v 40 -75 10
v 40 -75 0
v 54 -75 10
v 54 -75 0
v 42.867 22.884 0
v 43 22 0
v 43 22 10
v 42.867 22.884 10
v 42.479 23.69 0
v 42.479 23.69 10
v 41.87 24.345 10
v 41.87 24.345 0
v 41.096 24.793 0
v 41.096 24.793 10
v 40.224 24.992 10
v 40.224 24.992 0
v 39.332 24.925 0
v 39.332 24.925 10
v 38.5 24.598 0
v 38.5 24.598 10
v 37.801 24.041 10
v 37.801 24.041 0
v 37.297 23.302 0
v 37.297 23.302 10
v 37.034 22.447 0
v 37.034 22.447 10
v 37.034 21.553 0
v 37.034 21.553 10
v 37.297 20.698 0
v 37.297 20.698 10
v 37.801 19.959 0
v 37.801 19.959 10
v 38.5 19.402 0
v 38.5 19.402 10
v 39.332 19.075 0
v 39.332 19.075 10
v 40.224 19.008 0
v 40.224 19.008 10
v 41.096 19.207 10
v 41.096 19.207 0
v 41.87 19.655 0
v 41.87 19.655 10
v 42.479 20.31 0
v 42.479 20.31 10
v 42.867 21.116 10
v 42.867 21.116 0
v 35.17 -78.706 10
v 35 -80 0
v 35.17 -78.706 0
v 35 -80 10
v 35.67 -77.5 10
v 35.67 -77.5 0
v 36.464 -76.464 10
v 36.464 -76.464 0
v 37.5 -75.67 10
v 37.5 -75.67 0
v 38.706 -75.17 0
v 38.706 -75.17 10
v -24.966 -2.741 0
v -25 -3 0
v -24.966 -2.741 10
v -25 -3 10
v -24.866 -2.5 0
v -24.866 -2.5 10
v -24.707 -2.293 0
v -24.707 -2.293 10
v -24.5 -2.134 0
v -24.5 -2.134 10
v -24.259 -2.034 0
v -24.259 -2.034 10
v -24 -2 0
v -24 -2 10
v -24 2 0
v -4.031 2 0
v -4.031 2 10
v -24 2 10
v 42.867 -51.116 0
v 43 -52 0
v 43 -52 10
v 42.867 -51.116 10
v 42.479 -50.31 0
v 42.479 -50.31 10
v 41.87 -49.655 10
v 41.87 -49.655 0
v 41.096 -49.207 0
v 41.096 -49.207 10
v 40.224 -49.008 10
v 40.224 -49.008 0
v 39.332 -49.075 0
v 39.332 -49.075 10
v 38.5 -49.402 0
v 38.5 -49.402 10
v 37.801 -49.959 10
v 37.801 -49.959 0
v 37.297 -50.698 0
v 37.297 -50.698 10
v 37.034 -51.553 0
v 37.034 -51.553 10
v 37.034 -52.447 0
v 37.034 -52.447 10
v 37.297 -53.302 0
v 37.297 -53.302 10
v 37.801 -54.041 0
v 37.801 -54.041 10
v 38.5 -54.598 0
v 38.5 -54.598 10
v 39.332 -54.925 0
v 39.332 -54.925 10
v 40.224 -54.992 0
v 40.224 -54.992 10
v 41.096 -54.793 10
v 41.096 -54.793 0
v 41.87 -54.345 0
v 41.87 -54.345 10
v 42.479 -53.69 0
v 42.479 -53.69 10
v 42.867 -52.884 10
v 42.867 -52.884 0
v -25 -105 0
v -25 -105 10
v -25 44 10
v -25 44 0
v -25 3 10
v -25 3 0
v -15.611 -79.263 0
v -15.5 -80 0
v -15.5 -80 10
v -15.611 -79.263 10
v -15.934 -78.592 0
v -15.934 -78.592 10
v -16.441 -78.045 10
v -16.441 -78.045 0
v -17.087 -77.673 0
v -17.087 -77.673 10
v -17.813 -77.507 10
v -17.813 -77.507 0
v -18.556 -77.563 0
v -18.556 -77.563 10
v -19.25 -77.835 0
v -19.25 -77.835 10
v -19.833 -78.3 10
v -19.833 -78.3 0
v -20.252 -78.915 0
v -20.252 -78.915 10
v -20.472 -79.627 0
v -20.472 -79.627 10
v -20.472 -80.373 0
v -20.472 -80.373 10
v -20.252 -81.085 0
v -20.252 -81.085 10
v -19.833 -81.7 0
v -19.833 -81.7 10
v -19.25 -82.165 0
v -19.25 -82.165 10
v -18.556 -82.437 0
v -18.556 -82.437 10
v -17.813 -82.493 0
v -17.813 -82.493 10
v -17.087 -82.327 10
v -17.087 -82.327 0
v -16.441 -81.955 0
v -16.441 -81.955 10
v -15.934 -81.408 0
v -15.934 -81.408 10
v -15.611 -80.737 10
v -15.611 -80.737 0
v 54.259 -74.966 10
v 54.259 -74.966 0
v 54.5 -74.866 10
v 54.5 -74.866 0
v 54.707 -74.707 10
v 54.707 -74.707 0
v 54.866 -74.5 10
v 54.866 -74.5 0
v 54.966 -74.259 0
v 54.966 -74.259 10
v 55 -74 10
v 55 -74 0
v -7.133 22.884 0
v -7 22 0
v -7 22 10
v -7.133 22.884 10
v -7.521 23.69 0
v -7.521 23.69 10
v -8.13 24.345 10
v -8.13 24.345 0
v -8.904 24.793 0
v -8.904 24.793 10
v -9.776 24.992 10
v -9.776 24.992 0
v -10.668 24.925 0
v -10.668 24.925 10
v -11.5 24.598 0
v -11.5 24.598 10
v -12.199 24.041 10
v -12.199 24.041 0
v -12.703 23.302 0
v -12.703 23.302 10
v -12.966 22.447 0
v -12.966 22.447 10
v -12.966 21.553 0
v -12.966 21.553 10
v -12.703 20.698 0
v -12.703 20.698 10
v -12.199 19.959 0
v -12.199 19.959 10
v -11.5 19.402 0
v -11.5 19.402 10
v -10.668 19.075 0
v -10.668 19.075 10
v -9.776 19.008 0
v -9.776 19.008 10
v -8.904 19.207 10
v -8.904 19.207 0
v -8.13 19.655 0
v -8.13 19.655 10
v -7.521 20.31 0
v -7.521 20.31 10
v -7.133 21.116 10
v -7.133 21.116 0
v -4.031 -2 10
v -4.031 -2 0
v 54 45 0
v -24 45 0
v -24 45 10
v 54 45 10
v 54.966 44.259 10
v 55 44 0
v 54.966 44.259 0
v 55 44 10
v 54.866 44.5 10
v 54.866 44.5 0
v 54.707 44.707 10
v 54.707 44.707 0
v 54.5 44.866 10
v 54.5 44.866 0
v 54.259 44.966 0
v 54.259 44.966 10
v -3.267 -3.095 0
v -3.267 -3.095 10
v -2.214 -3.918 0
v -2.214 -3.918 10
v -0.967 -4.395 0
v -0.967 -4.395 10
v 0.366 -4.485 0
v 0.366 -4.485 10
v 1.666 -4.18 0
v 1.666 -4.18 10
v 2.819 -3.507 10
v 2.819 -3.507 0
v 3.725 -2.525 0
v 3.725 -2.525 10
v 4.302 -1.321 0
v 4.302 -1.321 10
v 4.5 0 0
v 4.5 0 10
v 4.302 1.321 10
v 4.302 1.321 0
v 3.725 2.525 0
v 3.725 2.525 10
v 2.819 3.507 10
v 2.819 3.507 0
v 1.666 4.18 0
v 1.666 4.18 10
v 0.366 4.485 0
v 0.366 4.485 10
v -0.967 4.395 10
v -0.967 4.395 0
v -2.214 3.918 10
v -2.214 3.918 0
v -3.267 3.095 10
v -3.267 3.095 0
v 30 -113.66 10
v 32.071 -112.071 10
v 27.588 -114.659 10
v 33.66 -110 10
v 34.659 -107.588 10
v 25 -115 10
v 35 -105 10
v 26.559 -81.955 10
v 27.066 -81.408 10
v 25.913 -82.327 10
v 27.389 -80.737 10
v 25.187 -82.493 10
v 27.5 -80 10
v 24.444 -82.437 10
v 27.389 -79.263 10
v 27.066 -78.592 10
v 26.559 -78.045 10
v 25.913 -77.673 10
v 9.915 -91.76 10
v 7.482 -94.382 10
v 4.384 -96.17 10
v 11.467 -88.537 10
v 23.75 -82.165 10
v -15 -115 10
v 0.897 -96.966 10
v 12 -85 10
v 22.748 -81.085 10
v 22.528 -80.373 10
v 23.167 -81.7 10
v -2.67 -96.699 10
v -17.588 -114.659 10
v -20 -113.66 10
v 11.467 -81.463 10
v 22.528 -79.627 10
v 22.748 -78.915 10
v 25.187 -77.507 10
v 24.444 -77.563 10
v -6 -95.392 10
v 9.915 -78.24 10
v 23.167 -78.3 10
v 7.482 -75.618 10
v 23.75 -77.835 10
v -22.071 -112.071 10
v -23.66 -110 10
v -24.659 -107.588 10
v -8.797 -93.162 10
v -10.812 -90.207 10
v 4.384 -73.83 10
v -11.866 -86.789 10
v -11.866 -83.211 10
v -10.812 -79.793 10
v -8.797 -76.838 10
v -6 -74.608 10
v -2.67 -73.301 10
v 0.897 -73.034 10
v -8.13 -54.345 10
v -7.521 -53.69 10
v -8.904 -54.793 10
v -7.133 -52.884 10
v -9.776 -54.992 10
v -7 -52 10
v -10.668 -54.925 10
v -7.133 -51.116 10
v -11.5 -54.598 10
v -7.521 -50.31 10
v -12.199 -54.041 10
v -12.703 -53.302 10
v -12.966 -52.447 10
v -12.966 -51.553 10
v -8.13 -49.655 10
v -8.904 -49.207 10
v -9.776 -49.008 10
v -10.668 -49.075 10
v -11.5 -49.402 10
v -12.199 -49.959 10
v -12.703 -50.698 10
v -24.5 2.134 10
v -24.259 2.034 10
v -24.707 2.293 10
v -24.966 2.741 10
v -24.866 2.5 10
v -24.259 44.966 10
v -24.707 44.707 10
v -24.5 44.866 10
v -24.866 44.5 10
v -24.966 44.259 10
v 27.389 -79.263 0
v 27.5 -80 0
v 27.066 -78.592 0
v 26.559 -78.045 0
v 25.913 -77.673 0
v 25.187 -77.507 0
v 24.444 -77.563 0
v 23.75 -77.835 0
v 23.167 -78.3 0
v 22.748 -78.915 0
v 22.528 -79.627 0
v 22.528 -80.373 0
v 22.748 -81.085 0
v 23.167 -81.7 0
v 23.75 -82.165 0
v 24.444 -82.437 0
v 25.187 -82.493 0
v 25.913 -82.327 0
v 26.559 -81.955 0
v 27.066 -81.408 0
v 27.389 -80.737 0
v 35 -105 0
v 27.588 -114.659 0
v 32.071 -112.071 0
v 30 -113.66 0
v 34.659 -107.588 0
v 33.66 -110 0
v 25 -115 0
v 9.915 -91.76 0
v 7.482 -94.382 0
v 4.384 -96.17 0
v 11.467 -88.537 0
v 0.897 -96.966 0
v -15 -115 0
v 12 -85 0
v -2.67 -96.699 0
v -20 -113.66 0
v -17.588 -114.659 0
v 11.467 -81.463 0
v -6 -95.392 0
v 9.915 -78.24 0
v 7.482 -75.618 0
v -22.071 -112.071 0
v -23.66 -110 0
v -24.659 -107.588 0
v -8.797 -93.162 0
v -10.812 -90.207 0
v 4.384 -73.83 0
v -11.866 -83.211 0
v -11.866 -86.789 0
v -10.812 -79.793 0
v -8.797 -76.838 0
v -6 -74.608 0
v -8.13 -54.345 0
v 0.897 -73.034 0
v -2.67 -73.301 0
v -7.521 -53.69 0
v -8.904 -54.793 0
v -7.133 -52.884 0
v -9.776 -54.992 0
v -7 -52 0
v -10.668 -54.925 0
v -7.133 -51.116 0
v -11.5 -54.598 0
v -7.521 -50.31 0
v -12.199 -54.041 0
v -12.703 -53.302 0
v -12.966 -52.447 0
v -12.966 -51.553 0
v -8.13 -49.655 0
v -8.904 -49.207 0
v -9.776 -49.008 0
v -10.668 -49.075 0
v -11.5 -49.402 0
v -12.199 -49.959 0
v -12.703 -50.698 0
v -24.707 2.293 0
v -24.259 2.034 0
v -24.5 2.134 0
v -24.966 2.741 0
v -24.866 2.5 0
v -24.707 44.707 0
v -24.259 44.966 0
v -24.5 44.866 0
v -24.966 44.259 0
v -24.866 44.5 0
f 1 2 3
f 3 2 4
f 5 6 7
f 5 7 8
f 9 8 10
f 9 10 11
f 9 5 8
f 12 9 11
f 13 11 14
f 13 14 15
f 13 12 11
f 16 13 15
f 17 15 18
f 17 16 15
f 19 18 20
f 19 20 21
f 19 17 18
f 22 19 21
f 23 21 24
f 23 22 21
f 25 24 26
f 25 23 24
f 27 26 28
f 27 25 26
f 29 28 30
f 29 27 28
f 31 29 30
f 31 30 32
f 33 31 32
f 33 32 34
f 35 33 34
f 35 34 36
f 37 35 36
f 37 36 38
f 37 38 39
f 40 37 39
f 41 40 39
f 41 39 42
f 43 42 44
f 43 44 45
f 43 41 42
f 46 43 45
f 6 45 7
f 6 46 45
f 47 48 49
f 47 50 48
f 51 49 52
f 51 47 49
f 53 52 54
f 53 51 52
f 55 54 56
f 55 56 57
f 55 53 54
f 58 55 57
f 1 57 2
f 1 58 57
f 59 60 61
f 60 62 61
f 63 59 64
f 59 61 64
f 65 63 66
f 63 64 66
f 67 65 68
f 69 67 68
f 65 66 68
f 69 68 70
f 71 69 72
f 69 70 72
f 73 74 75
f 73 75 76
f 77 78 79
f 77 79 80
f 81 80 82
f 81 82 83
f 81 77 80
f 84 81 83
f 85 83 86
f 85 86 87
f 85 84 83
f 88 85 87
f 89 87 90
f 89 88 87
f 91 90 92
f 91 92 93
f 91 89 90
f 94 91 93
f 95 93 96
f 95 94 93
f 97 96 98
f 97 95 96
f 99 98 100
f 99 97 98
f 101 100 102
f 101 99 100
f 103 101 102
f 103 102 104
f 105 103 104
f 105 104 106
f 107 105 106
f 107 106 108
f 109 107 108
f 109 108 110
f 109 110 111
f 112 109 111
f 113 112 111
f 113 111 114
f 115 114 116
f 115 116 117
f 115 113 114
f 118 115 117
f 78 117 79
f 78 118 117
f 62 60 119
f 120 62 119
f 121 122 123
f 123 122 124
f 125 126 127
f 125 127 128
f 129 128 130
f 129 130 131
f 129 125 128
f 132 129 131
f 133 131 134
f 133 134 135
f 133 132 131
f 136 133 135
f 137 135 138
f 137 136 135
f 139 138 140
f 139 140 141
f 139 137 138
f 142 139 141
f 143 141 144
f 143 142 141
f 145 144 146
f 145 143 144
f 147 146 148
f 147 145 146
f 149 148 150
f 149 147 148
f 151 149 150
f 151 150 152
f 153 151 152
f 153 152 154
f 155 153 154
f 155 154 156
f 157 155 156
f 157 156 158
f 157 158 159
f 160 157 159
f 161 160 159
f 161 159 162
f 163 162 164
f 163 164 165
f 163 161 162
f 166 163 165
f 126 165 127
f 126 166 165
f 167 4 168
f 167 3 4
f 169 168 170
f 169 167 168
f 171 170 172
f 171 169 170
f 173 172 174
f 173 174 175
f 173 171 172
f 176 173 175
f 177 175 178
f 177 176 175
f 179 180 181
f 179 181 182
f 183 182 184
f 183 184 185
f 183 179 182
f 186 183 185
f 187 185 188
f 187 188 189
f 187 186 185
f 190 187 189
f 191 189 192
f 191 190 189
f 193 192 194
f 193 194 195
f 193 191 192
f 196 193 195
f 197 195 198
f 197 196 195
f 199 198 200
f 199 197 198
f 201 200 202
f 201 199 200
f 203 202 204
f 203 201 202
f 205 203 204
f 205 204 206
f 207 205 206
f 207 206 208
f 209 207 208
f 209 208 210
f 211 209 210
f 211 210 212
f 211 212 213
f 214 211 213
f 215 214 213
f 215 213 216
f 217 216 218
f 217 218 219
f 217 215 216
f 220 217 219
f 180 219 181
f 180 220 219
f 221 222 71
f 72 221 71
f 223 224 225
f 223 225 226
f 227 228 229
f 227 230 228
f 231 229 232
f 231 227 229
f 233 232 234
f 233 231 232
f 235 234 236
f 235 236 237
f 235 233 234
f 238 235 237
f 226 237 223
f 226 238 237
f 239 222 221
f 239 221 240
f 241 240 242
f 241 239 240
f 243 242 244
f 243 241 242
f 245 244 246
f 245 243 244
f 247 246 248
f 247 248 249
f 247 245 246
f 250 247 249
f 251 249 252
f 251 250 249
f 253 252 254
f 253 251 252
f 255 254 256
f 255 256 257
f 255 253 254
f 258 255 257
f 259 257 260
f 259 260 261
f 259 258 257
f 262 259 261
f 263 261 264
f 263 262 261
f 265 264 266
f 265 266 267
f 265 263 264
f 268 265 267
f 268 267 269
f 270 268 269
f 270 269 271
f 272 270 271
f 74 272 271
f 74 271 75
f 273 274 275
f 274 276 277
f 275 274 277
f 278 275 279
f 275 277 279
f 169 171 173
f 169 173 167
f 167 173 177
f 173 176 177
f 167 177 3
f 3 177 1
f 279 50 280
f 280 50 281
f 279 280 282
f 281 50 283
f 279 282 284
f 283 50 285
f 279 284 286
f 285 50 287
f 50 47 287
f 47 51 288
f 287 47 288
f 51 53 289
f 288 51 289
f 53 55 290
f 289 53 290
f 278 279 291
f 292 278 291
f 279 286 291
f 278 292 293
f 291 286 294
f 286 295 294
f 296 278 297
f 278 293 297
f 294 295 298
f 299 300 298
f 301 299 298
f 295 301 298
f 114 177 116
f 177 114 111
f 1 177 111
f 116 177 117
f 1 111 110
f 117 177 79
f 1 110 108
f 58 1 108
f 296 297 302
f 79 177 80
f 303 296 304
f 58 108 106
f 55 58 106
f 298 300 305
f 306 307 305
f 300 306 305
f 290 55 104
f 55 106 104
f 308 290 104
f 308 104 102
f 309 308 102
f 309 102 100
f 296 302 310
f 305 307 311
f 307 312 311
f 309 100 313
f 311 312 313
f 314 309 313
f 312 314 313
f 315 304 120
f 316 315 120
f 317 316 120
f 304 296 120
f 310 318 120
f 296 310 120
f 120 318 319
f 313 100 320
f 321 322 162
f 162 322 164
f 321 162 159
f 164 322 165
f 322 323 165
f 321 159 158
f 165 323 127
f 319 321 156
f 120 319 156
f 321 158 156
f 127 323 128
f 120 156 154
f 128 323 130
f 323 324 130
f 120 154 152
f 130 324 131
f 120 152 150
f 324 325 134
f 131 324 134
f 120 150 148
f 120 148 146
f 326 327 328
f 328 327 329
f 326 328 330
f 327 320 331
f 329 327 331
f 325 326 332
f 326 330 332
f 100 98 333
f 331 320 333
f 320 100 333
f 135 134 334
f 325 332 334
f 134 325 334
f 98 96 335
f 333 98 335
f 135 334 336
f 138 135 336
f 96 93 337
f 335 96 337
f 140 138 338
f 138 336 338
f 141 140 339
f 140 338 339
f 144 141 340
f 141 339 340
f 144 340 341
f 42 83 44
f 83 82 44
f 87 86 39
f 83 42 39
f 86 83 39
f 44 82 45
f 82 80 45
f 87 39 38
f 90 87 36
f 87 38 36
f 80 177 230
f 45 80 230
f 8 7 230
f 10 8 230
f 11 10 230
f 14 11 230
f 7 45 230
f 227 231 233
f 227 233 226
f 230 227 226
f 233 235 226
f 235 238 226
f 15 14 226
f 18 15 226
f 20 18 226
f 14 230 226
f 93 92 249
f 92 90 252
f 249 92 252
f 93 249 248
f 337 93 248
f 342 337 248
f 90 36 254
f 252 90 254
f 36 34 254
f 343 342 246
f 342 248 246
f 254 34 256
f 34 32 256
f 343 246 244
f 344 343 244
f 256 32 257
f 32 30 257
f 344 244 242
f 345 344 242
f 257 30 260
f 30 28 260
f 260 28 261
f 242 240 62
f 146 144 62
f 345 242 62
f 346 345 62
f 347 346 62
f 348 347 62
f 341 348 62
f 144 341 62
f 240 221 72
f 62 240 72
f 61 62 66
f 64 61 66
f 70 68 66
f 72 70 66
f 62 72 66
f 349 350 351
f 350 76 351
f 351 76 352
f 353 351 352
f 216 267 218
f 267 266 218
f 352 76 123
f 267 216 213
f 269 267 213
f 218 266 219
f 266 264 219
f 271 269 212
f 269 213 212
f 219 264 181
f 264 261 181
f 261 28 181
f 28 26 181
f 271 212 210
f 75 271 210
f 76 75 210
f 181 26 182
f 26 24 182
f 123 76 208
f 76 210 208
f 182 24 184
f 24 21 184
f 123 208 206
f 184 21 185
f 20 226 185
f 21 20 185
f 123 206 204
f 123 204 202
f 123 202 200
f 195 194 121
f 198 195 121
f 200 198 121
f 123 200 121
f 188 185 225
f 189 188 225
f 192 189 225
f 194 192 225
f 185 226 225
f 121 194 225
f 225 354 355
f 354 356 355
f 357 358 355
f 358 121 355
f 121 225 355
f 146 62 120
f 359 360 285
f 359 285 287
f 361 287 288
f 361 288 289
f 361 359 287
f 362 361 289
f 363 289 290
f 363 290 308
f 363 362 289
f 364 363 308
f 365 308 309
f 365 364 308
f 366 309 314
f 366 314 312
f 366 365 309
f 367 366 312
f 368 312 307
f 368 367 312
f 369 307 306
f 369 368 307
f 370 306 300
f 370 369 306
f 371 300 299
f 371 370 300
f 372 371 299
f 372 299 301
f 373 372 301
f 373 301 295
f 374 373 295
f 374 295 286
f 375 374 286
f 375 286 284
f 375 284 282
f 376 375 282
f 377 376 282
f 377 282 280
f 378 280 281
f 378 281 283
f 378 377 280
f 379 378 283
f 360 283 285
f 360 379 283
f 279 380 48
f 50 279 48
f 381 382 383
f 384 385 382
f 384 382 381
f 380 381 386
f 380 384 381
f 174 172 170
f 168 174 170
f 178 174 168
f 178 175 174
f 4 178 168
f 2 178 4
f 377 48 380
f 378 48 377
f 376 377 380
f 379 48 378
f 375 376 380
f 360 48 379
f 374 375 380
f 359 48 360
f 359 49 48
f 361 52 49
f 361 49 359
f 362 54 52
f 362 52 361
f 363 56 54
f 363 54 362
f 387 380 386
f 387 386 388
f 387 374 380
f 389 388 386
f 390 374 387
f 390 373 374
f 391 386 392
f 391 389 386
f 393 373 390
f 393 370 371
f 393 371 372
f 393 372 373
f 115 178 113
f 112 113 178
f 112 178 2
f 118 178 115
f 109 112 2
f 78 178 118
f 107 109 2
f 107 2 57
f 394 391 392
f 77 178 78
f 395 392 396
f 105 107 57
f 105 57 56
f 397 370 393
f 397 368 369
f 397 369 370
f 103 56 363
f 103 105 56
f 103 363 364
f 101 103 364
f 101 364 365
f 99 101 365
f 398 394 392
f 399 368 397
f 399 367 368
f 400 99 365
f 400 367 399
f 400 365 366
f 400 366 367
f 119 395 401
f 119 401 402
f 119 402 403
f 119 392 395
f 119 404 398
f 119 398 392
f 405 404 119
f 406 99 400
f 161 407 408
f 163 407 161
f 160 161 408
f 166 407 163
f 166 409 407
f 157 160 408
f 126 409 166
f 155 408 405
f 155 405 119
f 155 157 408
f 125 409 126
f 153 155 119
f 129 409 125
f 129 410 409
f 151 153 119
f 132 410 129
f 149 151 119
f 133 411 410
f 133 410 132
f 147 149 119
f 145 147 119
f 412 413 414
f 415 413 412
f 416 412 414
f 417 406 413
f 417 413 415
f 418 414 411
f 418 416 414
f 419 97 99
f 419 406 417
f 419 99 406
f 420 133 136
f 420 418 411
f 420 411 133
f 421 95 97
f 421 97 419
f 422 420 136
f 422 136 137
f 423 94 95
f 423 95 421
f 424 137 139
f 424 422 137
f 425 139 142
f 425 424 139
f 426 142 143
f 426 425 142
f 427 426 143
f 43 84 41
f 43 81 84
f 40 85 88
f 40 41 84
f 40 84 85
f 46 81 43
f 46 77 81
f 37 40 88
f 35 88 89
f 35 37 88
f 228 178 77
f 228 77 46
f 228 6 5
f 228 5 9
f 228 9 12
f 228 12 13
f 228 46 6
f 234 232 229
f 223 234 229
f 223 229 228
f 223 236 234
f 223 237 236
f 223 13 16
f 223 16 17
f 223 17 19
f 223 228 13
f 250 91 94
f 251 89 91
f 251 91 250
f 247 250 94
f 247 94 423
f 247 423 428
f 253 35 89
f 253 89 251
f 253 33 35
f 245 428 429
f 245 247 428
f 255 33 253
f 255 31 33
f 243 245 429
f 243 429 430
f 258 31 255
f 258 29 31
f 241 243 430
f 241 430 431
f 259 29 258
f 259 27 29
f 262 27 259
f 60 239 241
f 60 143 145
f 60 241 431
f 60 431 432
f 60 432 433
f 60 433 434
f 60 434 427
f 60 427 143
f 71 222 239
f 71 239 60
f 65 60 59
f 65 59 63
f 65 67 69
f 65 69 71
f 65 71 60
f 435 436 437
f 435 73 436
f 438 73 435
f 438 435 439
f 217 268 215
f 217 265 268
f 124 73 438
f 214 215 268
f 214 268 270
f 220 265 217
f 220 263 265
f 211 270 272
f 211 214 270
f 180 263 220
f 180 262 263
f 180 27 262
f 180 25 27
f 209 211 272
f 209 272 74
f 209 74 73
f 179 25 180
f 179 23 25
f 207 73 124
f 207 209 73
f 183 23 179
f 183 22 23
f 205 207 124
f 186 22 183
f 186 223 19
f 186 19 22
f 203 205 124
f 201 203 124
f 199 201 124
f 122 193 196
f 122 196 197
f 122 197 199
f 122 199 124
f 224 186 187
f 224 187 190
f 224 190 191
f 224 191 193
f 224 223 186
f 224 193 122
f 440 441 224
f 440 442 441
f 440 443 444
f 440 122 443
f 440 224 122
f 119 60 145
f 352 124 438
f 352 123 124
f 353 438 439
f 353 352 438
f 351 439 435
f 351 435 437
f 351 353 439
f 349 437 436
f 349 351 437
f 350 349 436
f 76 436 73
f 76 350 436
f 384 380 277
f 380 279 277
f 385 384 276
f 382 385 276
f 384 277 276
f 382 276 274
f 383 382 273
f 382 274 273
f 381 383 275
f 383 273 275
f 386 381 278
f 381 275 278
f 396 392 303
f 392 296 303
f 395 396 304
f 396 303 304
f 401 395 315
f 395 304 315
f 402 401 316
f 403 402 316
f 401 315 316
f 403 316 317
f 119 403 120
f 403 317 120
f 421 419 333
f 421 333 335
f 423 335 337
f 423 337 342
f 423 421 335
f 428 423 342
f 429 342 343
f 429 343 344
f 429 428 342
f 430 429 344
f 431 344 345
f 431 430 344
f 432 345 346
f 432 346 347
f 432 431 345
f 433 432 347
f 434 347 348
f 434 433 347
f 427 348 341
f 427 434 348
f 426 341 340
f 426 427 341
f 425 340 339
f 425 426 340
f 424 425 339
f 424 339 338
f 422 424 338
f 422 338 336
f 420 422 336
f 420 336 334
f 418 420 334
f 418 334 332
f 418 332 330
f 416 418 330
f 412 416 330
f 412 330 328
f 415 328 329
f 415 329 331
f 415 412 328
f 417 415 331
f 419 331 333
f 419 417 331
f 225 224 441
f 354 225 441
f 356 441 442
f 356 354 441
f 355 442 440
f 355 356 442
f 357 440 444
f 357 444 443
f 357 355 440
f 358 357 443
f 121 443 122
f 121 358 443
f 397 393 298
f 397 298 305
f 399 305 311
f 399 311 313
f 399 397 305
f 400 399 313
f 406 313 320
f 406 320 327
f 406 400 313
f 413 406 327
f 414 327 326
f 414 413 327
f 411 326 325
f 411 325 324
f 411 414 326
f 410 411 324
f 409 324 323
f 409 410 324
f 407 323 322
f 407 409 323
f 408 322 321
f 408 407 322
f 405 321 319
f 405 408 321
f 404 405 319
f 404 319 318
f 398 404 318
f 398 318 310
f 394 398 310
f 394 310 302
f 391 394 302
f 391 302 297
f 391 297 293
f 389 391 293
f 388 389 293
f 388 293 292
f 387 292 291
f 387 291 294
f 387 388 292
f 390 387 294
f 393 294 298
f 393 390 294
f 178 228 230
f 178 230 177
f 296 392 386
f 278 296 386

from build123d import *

# Parameters (mm, degrees)
SKETCH_R    = 12
SKETCH_R_2  = 3
SKETCH_R_3  = 2.5
PAD_DEPTH   = 10
FILLET_R    = 5
FILLET001_R = 1
FILLET002_R = 10


with BuildPart() as part:
    # Sketch → Pad (new body)
    with BuildSketch(Plane.XY):
        with BuildLine():
            ThreePointArc((-4.031129, -2), (4.5, 0), (-4.031129, 2))
            Line((-4.031129, 2), (-25, 2))
            Line((-25, 45), (-25, 2))
            Line((-25, 45), (55, 45))
            Line((55, 45), (55, -75))
            Line((35, -75), (55, -75))
            Line((35, -115), (35, -75))
            Line((-25, -115), (35, -115))
            Line((-25, -2), (-25, -115))
            Line((-4.031129, -2), (-25, -2))
        make_face()
        with Locations((0, -85)):
            Circle(SKETCH_R, mode=Mode.SUBTRACT)
        with Locations((-10, -52)):
            Circle(SKETCH_R_2, mode=Mode.SUBTRACT)
        with Locations((40, -52)):
            Circle(SKETCH_R_2, mode=Mode.SUBTRACT)
        with Locations((40, 22)):
            Circle(SKETCH_R_2, mode=Mode.SUBTRACT)
        with Locations((-10, 22)):
            Circle(SKETCH_R_2, mode=Mode.SUBTRACT)
        with Locations((25, -80)):
            Circle(SKETCH_R_3, mode=Mode.SUBTRACT)
        with Locations((-18, -80)):
            Circle(SKETCH_R_3, mode=Mode.SUBTRACT)
    extrude(amount=PAD_DEPTH)

    # Fillet
    fillet_edges = [part.edges().sort_by_distance(p)[0] for p in [
        (35, -75, 5),
    ]]
    fillet(fillet_edges, radius=FILLET_R)

    # Fillet001
    fillet001_edges = [part.edges().sort_by_distance(p)[0] for p in [
        (55, -75, 5),
        (55, 45, 5),
        (-25, 2, 5),
        (-25, -2, 5),
        (-25, 45, 5),
    ]]
    fillet(fillet001_edges, radius=FILLET001_R)

    # Fillet002
    fillet002_edges = [part.edges().sort_by_distance(p)[0] for p in [
        (-25, -115, 5),
        (35, -115, 5),
    ]]
    fillet(fillet002_edges, radius=FILLET002_R)


solid = part.part
